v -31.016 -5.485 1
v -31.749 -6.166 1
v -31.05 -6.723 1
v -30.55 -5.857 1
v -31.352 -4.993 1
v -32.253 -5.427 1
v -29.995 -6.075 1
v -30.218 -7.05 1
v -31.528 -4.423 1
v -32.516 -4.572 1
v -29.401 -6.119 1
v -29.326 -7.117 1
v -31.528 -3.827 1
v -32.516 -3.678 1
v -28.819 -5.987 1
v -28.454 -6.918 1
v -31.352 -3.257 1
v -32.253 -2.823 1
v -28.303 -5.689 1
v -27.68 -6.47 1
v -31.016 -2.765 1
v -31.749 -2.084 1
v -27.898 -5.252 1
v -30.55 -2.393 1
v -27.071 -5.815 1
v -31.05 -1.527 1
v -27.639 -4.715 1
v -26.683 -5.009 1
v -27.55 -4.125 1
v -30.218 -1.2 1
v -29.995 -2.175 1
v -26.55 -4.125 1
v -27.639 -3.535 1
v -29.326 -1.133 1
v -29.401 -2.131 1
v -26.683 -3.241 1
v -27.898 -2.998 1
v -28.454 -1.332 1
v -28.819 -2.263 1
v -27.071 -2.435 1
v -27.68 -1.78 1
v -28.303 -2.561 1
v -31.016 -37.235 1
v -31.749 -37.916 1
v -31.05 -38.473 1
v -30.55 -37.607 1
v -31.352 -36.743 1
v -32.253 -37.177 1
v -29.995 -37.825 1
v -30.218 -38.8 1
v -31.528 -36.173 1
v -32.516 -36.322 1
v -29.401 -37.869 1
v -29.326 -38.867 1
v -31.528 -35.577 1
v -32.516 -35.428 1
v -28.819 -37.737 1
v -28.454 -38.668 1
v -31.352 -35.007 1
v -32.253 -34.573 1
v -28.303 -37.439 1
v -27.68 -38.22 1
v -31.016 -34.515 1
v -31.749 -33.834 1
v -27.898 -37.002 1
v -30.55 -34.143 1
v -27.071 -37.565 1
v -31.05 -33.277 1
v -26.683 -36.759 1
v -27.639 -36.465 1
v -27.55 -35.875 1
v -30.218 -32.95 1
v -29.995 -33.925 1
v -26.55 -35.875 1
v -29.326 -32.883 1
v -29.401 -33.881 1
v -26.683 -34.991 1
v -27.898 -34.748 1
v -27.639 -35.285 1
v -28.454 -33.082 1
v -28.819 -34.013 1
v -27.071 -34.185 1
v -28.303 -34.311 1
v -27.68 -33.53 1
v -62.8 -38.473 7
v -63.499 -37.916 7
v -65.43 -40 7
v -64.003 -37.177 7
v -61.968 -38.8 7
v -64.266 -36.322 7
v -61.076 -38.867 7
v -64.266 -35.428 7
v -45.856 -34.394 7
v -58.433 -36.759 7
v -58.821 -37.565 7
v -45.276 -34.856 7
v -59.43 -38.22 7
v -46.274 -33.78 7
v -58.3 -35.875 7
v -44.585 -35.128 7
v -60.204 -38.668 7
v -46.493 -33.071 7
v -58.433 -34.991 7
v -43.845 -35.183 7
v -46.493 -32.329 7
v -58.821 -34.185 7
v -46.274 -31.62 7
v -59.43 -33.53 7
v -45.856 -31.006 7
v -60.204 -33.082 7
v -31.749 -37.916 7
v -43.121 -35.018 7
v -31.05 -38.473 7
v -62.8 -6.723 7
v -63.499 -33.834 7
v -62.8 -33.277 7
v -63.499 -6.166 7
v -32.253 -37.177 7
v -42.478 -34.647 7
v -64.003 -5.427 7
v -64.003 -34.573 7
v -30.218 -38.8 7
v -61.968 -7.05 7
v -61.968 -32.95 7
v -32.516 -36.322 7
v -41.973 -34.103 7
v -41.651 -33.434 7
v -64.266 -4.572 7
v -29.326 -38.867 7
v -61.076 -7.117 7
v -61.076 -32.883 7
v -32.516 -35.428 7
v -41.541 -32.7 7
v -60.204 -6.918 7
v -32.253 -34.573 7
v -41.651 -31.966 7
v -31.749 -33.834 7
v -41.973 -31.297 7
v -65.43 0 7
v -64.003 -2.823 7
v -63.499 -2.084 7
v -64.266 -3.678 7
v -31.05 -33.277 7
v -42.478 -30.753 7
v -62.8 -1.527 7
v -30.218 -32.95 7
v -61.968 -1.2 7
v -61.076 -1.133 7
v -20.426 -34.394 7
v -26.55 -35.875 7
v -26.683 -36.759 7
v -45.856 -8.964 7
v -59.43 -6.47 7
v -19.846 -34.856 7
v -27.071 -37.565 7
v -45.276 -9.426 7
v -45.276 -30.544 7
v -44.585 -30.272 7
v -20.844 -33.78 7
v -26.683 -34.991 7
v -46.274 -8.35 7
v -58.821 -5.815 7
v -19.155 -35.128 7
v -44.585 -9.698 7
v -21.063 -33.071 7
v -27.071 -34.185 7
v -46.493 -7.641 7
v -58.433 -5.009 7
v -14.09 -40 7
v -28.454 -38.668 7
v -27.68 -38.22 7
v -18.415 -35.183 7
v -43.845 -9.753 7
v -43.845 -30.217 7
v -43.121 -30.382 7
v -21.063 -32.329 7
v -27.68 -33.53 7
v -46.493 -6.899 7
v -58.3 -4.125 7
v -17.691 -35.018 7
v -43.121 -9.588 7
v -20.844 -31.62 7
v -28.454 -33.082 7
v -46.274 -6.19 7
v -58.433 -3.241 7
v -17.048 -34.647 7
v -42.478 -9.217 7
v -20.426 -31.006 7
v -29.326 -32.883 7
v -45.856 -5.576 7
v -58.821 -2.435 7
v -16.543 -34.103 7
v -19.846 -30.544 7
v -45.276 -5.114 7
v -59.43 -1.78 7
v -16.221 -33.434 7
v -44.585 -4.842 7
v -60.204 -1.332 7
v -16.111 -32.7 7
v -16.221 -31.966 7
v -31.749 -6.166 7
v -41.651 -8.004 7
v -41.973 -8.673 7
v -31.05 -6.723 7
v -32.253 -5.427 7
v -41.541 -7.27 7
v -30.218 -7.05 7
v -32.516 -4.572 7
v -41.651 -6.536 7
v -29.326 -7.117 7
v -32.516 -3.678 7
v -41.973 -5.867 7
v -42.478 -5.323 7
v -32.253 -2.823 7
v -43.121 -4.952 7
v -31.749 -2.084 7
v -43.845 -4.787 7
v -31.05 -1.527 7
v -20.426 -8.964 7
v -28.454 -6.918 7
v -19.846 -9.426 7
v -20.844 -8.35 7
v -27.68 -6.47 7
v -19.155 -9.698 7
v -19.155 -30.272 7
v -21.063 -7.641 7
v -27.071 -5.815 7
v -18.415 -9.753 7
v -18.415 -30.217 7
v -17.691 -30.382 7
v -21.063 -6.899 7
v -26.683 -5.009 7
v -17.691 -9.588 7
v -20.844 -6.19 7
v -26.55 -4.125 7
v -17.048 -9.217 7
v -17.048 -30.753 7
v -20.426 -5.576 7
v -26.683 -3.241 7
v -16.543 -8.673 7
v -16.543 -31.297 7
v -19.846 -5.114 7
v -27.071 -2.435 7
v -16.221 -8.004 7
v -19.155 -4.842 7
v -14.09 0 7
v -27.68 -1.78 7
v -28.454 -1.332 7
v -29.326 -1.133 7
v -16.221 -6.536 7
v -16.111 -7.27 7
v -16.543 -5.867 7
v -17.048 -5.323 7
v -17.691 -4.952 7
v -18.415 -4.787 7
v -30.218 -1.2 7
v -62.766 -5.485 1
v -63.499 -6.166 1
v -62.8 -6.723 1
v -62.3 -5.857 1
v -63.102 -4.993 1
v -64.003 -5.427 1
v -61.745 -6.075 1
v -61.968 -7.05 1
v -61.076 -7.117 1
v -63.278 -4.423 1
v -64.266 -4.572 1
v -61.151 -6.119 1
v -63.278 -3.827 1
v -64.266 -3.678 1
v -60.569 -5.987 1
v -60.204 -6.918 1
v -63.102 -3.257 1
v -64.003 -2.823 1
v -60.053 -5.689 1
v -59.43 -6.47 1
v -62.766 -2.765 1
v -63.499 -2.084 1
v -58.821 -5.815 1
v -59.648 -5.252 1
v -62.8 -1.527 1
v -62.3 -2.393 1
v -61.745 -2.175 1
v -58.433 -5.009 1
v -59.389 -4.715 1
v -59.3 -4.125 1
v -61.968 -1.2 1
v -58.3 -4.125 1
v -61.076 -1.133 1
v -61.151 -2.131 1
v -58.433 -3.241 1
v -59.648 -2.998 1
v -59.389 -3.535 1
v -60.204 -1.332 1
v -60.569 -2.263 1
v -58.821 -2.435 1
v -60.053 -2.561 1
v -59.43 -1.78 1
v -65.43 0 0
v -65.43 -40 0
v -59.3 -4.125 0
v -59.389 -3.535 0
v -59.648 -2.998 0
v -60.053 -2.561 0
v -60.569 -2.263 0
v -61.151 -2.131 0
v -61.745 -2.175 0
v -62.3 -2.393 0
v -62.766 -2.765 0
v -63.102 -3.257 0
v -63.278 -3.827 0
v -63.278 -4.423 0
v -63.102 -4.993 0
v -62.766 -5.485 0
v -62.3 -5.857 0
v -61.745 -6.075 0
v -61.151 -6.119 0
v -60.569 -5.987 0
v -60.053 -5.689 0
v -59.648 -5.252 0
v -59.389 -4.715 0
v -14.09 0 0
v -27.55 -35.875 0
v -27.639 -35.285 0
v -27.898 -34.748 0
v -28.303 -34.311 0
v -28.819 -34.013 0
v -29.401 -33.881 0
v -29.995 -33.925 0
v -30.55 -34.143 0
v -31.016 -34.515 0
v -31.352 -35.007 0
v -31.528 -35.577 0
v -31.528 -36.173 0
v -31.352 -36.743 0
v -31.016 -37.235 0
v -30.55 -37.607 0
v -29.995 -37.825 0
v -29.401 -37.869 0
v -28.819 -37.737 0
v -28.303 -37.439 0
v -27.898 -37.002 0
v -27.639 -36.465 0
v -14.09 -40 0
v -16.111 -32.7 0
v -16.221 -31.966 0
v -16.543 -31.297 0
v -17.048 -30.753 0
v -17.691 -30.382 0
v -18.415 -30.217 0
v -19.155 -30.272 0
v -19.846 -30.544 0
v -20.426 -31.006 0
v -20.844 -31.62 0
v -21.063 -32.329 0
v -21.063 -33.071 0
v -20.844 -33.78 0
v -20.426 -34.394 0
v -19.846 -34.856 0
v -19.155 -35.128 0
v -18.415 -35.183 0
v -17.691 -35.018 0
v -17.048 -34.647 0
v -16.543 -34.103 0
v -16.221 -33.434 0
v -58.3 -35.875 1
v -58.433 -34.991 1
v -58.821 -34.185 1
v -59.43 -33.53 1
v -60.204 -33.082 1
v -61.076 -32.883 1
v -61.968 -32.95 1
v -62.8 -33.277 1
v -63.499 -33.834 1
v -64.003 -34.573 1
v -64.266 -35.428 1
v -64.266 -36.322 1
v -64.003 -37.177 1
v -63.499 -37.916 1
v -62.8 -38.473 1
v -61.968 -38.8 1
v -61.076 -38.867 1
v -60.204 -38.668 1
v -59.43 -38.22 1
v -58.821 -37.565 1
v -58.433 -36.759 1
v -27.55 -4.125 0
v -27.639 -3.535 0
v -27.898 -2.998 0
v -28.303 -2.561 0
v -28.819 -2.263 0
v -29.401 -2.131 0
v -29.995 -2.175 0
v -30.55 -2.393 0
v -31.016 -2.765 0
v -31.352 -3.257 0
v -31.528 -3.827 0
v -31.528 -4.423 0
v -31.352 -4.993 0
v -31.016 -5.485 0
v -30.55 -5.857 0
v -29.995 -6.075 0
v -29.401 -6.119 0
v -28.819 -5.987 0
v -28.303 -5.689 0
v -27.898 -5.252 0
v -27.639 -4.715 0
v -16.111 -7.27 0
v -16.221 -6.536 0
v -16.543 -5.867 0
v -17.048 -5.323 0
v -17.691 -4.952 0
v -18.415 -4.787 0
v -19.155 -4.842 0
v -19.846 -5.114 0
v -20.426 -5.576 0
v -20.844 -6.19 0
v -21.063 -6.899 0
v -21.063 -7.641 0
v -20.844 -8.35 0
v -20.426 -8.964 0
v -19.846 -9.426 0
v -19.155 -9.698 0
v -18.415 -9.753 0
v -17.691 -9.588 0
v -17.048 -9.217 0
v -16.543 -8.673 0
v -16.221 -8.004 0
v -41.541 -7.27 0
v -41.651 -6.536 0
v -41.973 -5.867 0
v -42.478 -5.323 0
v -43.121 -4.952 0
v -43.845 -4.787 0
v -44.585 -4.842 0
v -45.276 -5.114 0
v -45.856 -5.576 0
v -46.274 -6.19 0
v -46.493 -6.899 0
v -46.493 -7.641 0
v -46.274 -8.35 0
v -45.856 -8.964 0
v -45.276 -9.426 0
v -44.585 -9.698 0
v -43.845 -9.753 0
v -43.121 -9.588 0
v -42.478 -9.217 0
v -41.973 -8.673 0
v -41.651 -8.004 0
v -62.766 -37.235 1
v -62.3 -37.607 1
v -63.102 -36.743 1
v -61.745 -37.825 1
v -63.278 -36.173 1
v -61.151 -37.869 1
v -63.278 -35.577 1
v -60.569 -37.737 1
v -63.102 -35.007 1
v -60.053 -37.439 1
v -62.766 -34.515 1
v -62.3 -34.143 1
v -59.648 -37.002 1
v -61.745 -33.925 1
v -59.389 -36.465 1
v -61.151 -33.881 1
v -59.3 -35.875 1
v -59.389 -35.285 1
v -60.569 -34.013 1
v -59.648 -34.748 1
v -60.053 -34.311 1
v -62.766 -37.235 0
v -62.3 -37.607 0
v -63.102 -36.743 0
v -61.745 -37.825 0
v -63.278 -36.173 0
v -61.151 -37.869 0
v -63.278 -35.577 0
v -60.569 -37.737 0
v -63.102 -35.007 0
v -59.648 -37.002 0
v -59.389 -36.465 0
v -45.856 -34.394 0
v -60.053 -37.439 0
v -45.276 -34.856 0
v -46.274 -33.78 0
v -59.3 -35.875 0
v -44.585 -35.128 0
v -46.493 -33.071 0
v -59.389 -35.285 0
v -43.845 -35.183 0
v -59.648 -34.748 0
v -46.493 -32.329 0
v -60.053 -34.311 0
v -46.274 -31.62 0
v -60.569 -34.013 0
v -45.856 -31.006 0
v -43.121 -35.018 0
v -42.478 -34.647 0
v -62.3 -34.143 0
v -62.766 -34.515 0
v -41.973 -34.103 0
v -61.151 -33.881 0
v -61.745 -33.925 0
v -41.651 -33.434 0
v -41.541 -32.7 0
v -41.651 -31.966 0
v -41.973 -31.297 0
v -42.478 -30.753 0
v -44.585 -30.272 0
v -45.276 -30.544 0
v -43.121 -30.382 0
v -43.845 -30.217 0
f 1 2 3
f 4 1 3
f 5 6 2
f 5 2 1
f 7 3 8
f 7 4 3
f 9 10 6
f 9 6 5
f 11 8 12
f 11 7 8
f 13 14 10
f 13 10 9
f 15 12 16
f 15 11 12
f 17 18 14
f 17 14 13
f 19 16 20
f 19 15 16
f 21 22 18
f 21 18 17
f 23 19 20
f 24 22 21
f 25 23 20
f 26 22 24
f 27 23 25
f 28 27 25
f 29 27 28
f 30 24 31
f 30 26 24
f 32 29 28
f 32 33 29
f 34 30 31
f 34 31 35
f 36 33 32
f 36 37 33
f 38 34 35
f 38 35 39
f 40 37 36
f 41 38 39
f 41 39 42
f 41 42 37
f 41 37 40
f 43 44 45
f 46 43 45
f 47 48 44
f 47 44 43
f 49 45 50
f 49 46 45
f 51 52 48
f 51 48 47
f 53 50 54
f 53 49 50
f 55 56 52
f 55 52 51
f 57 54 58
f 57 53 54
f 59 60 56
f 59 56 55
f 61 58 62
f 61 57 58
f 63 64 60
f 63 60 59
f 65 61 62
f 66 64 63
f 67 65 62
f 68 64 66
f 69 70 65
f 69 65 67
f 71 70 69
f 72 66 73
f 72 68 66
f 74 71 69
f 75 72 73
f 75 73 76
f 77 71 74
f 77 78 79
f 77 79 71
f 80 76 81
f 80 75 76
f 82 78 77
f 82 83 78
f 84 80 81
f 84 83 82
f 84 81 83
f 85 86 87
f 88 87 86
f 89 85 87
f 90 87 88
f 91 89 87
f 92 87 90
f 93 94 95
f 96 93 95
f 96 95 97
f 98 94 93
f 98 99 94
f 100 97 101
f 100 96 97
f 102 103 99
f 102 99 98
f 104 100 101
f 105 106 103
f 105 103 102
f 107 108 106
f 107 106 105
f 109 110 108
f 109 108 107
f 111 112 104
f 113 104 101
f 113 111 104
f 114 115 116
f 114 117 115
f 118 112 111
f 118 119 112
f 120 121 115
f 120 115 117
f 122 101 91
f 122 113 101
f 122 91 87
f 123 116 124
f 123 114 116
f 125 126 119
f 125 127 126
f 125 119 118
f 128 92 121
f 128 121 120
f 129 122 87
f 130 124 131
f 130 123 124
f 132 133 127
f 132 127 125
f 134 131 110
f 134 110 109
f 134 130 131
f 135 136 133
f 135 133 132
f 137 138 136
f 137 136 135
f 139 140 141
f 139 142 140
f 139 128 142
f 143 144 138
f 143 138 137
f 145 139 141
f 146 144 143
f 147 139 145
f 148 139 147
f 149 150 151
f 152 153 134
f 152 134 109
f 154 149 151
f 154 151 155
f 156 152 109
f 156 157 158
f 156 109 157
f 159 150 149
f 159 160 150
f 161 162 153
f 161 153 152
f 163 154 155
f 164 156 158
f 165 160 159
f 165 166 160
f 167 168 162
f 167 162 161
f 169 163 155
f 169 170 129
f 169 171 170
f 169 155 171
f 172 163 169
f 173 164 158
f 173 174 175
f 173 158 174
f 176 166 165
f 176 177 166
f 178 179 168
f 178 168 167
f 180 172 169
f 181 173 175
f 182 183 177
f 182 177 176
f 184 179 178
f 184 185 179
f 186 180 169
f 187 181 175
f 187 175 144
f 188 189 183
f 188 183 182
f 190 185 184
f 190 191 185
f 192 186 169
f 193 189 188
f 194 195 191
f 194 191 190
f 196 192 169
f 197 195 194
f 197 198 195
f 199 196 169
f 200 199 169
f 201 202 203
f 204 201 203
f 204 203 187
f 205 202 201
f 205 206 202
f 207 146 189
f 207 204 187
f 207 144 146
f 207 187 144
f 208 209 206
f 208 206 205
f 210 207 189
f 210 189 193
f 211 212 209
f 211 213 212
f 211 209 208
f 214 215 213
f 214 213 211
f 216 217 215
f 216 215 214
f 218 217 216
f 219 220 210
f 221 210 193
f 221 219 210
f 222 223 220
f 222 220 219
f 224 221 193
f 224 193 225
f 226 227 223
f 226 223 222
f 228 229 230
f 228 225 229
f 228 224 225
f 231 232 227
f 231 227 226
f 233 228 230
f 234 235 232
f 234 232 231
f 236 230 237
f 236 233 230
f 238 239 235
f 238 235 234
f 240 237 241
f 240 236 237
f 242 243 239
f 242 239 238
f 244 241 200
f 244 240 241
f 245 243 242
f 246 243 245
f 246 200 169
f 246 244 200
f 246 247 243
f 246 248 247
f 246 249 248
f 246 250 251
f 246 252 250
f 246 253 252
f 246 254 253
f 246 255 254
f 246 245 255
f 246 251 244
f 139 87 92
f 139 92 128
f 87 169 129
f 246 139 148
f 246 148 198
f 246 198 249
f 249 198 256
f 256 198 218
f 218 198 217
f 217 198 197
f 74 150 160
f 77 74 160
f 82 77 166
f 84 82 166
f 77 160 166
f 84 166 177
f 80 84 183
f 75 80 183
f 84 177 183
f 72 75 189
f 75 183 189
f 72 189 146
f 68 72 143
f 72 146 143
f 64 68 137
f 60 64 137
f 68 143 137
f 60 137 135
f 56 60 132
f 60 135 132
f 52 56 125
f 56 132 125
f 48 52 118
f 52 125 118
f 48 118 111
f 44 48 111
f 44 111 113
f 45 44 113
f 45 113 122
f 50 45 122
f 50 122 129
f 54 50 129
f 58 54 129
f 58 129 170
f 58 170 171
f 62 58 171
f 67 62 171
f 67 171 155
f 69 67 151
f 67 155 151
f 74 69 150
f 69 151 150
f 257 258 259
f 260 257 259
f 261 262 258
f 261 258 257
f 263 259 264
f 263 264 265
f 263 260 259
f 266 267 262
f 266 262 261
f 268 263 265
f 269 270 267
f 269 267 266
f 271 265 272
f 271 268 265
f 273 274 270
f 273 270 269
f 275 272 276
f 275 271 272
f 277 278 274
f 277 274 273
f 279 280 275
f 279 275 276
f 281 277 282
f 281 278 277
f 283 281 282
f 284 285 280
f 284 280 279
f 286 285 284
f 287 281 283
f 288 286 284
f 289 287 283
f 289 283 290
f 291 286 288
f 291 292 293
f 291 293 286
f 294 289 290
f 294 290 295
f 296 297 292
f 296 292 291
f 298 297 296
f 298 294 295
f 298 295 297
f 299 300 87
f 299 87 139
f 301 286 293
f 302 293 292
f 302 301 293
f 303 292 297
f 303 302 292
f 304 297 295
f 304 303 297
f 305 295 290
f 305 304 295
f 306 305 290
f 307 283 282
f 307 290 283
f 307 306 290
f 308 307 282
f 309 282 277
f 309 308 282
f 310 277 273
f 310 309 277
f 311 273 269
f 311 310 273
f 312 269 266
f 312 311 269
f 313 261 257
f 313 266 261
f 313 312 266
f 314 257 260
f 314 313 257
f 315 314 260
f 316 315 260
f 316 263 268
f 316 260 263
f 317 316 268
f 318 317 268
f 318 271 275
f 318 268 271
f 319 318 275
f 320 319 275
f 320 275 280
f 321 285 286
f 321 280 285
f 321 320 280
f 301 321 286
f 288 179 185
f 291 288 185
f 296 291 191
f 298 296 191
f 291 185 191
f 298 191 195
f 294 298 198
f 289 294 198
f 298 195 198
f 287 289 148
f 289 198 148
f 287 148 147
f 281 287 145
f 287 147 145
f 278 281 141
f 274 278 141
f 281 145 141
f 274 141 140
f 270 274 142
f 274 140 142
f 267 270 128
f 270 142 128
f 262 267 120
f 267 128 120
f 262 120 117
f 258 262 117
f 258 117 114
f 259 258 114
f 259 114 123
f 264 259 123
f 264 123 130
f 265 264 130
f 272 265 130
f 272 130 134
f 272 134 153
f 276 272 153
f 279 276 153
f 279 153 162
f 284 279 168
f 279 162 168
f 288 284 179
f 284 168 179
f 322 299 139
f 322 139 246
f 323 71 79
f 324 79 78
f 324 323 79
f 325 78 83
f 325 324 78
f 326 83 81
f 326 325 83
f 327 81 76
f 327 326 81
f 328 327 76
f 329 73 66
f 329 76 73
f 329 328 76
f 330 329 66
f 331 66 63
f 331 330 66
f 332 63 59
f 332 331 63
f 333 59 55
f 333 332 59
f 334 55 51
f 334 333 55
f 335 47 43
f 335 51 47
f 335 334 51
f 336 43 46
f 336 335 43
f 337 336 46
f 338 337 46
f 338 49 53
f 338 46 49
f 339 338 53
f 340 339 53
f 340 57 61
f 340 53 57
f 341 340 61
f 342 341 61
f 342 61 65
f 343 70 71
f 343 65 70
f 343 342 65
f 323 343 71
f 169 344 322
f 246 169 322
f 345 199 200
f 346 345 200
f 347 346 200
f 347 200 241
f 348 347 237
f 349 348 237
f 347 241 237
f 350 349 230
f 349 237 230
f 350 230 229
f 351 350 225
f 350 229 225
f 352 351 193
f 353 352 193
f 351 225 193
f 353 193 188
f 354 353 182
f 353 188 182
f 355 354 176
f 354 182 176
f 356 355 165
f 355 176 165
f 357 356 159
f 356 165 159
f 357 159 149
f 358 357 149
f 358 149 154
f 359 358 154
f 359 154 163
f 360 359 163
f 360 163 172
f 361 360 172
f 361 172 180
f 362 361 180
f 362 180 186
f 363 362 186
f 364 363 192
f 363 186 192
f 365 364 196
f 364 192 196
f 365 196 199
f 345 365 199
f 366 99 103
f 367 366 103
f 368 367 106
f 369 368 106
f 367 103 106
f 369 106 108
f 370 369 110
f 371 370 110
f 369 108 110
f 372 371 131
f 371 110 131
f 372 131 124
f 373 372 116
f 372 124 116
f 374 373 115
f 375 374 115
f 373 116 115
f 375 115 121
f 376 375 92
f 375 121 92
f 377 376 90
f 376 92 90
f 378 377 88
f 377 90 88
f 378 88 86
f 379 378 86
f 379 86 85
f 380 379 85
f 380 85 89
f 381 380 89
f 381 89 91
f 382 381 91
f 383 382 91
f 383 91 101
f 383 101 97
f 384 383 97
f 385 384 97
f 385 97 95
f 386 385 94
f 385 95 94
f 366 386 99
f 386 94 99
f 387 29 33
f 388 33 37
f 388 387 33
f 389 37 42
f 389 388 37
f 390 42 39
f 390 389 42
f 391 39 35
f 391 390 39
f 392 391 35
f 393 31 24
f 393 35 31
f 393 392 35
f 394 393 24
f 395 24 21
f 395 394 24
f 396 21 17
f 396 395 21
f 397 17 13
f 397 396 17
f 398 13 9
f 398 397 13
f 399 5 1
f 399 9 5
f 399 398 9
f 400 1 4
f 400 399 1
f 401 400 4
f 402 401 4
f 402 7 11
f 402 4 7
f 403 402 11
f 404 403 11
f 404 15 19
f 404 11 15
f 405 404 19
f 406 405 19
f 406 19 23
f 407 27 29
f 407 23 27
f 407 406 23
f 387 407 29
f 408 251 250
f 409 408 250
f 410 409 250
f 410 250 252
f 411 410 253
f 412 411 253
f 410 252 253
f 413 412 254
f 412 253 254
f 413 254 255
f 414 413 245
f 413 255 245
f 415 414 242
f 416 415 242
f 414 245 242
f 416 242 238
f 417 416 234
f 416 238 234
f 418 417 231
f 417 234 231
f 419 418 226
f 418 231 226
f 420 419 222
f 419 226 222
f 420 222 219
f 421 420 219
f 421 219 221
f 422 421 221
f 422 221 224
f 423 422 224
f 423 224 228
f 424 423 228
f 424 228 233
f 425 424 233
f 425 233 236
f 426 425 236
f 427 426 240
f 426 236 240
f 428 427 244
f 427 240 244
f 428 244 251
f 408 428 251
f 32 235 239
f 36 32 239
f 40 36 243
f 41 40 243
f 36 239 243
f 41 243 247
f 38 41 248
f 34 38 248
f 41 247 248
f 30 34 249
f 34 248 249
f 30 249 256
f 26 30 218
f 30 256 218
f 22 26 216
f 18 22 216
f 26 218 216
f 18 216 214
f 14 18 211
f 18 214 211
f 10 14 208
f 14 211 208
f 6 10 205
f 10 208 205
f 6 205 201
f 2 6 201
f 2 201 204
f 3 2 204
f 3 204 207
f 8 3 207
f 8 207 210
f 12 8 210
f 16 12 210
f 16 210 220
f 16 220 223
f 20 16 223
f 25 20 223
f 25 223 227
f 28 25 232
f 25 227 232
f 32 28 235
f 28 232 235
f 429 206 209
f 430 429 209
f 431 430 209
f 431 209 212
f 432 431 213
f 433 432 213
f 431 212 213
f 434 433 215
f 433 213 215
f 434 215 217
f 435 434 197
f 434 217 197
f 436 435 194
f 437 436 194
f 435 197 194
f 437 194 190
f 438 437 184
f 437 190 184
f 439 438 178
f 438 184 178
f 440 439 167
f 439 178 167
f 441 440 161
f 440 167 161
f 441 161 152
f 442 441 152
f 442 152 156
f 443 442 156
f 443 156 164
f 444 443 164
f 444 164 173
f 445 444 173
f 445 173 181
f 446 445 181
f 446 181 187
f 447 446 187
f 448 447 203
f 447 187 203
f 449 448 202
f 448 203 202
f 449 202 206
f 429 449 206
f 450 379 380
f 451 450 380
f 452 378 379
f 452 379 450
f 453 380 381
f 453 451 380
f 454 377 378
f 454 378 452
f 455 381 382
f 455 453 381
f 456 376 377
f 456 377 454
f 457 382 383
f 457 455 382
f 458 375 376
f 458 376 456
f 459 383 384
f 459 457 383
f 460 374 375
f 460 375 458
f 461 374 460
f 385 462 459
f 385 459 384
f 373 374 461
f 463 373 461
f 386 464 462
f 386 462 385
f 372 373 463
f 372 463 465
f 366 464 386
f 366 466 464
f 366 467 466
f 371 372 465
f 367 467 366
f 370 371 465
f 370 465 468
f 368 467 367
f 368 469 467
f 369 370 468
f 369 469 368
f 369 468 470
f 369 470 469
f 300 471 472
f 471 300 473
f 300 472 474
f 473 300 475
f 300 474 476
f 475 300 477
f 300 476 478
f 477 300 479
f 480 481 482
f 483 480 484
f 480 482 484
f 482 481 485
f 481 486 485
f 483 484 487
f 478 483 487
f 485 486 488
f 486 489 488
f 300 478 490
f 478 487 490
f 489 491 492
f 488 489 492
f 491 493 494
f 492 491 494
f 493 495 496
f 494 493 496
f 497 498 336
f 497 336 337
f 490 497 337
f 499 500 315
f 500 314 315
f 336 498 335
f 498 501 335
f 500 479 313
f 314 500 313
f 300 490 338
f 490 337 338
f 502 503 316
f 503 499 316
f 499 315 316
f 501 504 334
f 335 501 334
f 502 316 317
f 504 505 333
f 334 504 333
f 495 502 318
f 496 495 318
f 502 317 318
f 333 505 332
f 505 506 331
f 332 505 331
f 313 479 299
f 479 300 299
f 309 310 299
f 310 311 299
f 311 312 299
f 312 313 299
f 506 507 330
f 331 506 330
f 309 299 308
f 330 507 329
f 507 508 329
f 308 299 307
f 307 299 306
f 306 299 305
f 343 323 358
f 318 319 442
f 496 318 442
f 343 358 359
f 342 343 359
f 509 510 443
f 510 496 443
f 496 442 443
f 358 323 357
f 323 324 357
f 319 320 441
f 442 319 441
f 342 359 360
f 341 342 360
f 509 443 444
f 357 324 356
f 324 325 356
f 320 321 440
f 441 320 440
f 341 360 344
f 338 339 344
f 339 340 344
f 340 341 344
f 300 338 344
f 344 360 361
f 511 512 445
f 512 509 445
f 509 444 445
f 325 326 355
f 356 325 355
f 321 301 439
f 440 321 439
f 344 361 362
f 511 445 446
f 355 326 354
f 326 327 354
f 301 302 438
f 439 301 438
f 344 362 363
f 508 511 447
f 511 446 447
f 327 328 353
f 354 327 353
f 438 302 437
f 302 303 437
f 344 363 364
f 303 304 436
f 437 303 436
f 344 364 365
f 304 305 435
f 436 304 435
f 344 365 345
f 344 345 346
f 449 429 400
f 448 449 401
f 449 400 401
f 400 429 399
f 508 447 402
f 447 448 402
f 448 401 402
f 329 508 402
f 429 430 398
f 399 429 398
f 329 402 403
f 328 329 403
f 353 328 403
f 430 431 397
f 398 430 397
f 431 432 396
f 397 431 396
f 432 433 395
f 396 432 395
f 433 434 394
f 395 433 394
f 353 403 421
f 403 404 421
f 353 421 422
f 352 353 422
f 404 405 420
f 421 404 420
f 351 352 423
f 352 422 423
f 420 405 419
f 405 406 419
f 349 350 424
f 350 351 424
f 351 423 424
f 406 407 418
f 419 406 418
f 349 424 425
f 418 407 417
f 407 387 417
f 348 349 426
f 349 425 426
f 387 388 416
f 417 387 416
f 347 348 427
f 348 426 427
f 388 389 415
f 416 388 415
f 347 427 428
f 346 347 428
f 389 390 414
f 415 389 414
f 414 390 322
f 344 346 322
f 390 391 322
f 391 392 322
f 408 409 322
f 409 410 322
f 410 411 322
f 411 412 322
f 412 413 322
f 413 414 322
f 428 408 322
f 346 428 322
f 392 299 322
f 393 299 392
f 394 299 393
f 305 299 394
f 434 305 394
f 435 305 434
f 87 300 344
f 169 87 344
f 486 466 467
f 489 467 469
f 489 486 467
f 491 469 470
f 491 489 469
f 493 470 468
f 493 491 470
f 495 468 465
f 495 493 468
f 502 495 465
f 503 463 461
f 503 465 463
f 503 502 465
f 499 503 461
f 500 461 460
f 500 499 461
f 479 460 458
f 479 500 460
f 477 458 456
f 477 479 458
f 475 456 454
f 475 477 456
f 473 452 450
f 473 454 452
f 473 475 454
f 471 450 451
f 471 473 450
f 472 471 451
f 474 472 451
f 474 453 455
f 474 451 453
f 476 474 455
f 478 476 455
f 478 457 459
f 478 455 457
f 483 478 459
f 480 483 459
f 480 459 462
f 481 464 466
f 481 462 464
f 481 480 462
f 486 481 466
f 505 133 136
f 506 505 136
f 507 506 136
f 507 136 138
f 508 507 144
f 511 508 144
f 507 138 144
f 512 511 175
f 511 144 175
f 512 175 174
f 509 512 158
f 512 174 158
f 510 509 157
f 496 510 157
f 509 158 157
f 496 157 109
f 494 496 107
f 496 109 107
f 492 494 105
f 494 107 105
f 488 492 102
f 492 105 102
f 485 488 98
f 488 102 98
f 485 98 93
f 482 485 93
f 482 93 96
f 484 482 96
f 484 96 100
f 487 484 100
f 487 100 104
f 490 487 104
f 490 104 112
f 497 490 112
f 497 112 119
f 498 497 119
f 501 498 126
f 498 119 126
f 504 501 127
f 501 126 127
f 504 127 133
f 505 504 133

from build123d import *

# Parameters (mm, degrees)
SKETCH1_W           = 51.34
SKETCH1_H           = 40
BOSS_EXTRUDE1_DEPTH = 7
SKETCH2_R           = 2
CUT_EXTRUDE2_DEPTH  = 8
SKETCH8_R           = 3
CUT_EXTRUDE6_DEPTH  = 6
SKETCH9_R           = 2.49
CUT_EXTRUDE7_DEPTH  = 7


with BuildPart() as part:
    # Sketch1 → Boss-Extrude1 (new body)
    with BuildSketch(Plane.XY):
        with Locations((-39.76, -20)):
            Rectangle(SKETCH1_W, SKETCH1_H)
    extrude(amount=BOSS_EXTRUDE1_DEPTH)

    # Sketch2 → Cut-Extrude2 (cut, through all)
    with BuildSketch(Plane.XY):
        with Locations((-61.3, -35.875)):
            Circle(SKETCH2_R)
        with Locations((-29.55, -35.875)):
            Circle(SKETCH2_R)
        with Locations((-29.55, -4.125)):
            Circle(SKETCH2_R)
        with Locations((-61.3, -4.125)):
            Circle(SKETCH2_R)
    extrude(amount=CUT_EXTRUDE2_DEPTH, mode=Mode.SUBTRACT)

    # Sketch8 → Cut-Extrude6 (cut)
    with BuildSketch(Plane.XY.offset(7)):
        with Locations((-61.3, -4.125)):
            Circle(SKETCH8_R)
        with Locations((-29.55, -4.125)):
            Circle(SKETCH8_R)
        with Locations((-29.55, -35.875)):
            Circle(SKETCH8_R)
        with Locations((-61.3, -35.875)):
            Circle(SKETCH8_R)
    extrude(amount=-CUT_EXTRUDE6_DEPTH, mode=Mode.SUBTRACT)

    # Sketch9 → Cut-Extrude7 (cut)
    with BuildSketch(Plane.XY.offset(7)):
        with Locations((-44.030806884, -7.27)):
            Circle(SKETCH9_R)
        with Locations((-18.600806884, -7.27)):
            Circle(SKETCH9_R)
        with Locations((-44.030806884, -32.7)):
            Circle(SKETCH9_R)
        with Locations((-18.600806884, -32.7)):
            Circle(SKETCH9_R)
    extrude(amount=-CUT_EXTRUDE7_DEPTH, mode=Mode.SUBTRACT)


solid = part.part
